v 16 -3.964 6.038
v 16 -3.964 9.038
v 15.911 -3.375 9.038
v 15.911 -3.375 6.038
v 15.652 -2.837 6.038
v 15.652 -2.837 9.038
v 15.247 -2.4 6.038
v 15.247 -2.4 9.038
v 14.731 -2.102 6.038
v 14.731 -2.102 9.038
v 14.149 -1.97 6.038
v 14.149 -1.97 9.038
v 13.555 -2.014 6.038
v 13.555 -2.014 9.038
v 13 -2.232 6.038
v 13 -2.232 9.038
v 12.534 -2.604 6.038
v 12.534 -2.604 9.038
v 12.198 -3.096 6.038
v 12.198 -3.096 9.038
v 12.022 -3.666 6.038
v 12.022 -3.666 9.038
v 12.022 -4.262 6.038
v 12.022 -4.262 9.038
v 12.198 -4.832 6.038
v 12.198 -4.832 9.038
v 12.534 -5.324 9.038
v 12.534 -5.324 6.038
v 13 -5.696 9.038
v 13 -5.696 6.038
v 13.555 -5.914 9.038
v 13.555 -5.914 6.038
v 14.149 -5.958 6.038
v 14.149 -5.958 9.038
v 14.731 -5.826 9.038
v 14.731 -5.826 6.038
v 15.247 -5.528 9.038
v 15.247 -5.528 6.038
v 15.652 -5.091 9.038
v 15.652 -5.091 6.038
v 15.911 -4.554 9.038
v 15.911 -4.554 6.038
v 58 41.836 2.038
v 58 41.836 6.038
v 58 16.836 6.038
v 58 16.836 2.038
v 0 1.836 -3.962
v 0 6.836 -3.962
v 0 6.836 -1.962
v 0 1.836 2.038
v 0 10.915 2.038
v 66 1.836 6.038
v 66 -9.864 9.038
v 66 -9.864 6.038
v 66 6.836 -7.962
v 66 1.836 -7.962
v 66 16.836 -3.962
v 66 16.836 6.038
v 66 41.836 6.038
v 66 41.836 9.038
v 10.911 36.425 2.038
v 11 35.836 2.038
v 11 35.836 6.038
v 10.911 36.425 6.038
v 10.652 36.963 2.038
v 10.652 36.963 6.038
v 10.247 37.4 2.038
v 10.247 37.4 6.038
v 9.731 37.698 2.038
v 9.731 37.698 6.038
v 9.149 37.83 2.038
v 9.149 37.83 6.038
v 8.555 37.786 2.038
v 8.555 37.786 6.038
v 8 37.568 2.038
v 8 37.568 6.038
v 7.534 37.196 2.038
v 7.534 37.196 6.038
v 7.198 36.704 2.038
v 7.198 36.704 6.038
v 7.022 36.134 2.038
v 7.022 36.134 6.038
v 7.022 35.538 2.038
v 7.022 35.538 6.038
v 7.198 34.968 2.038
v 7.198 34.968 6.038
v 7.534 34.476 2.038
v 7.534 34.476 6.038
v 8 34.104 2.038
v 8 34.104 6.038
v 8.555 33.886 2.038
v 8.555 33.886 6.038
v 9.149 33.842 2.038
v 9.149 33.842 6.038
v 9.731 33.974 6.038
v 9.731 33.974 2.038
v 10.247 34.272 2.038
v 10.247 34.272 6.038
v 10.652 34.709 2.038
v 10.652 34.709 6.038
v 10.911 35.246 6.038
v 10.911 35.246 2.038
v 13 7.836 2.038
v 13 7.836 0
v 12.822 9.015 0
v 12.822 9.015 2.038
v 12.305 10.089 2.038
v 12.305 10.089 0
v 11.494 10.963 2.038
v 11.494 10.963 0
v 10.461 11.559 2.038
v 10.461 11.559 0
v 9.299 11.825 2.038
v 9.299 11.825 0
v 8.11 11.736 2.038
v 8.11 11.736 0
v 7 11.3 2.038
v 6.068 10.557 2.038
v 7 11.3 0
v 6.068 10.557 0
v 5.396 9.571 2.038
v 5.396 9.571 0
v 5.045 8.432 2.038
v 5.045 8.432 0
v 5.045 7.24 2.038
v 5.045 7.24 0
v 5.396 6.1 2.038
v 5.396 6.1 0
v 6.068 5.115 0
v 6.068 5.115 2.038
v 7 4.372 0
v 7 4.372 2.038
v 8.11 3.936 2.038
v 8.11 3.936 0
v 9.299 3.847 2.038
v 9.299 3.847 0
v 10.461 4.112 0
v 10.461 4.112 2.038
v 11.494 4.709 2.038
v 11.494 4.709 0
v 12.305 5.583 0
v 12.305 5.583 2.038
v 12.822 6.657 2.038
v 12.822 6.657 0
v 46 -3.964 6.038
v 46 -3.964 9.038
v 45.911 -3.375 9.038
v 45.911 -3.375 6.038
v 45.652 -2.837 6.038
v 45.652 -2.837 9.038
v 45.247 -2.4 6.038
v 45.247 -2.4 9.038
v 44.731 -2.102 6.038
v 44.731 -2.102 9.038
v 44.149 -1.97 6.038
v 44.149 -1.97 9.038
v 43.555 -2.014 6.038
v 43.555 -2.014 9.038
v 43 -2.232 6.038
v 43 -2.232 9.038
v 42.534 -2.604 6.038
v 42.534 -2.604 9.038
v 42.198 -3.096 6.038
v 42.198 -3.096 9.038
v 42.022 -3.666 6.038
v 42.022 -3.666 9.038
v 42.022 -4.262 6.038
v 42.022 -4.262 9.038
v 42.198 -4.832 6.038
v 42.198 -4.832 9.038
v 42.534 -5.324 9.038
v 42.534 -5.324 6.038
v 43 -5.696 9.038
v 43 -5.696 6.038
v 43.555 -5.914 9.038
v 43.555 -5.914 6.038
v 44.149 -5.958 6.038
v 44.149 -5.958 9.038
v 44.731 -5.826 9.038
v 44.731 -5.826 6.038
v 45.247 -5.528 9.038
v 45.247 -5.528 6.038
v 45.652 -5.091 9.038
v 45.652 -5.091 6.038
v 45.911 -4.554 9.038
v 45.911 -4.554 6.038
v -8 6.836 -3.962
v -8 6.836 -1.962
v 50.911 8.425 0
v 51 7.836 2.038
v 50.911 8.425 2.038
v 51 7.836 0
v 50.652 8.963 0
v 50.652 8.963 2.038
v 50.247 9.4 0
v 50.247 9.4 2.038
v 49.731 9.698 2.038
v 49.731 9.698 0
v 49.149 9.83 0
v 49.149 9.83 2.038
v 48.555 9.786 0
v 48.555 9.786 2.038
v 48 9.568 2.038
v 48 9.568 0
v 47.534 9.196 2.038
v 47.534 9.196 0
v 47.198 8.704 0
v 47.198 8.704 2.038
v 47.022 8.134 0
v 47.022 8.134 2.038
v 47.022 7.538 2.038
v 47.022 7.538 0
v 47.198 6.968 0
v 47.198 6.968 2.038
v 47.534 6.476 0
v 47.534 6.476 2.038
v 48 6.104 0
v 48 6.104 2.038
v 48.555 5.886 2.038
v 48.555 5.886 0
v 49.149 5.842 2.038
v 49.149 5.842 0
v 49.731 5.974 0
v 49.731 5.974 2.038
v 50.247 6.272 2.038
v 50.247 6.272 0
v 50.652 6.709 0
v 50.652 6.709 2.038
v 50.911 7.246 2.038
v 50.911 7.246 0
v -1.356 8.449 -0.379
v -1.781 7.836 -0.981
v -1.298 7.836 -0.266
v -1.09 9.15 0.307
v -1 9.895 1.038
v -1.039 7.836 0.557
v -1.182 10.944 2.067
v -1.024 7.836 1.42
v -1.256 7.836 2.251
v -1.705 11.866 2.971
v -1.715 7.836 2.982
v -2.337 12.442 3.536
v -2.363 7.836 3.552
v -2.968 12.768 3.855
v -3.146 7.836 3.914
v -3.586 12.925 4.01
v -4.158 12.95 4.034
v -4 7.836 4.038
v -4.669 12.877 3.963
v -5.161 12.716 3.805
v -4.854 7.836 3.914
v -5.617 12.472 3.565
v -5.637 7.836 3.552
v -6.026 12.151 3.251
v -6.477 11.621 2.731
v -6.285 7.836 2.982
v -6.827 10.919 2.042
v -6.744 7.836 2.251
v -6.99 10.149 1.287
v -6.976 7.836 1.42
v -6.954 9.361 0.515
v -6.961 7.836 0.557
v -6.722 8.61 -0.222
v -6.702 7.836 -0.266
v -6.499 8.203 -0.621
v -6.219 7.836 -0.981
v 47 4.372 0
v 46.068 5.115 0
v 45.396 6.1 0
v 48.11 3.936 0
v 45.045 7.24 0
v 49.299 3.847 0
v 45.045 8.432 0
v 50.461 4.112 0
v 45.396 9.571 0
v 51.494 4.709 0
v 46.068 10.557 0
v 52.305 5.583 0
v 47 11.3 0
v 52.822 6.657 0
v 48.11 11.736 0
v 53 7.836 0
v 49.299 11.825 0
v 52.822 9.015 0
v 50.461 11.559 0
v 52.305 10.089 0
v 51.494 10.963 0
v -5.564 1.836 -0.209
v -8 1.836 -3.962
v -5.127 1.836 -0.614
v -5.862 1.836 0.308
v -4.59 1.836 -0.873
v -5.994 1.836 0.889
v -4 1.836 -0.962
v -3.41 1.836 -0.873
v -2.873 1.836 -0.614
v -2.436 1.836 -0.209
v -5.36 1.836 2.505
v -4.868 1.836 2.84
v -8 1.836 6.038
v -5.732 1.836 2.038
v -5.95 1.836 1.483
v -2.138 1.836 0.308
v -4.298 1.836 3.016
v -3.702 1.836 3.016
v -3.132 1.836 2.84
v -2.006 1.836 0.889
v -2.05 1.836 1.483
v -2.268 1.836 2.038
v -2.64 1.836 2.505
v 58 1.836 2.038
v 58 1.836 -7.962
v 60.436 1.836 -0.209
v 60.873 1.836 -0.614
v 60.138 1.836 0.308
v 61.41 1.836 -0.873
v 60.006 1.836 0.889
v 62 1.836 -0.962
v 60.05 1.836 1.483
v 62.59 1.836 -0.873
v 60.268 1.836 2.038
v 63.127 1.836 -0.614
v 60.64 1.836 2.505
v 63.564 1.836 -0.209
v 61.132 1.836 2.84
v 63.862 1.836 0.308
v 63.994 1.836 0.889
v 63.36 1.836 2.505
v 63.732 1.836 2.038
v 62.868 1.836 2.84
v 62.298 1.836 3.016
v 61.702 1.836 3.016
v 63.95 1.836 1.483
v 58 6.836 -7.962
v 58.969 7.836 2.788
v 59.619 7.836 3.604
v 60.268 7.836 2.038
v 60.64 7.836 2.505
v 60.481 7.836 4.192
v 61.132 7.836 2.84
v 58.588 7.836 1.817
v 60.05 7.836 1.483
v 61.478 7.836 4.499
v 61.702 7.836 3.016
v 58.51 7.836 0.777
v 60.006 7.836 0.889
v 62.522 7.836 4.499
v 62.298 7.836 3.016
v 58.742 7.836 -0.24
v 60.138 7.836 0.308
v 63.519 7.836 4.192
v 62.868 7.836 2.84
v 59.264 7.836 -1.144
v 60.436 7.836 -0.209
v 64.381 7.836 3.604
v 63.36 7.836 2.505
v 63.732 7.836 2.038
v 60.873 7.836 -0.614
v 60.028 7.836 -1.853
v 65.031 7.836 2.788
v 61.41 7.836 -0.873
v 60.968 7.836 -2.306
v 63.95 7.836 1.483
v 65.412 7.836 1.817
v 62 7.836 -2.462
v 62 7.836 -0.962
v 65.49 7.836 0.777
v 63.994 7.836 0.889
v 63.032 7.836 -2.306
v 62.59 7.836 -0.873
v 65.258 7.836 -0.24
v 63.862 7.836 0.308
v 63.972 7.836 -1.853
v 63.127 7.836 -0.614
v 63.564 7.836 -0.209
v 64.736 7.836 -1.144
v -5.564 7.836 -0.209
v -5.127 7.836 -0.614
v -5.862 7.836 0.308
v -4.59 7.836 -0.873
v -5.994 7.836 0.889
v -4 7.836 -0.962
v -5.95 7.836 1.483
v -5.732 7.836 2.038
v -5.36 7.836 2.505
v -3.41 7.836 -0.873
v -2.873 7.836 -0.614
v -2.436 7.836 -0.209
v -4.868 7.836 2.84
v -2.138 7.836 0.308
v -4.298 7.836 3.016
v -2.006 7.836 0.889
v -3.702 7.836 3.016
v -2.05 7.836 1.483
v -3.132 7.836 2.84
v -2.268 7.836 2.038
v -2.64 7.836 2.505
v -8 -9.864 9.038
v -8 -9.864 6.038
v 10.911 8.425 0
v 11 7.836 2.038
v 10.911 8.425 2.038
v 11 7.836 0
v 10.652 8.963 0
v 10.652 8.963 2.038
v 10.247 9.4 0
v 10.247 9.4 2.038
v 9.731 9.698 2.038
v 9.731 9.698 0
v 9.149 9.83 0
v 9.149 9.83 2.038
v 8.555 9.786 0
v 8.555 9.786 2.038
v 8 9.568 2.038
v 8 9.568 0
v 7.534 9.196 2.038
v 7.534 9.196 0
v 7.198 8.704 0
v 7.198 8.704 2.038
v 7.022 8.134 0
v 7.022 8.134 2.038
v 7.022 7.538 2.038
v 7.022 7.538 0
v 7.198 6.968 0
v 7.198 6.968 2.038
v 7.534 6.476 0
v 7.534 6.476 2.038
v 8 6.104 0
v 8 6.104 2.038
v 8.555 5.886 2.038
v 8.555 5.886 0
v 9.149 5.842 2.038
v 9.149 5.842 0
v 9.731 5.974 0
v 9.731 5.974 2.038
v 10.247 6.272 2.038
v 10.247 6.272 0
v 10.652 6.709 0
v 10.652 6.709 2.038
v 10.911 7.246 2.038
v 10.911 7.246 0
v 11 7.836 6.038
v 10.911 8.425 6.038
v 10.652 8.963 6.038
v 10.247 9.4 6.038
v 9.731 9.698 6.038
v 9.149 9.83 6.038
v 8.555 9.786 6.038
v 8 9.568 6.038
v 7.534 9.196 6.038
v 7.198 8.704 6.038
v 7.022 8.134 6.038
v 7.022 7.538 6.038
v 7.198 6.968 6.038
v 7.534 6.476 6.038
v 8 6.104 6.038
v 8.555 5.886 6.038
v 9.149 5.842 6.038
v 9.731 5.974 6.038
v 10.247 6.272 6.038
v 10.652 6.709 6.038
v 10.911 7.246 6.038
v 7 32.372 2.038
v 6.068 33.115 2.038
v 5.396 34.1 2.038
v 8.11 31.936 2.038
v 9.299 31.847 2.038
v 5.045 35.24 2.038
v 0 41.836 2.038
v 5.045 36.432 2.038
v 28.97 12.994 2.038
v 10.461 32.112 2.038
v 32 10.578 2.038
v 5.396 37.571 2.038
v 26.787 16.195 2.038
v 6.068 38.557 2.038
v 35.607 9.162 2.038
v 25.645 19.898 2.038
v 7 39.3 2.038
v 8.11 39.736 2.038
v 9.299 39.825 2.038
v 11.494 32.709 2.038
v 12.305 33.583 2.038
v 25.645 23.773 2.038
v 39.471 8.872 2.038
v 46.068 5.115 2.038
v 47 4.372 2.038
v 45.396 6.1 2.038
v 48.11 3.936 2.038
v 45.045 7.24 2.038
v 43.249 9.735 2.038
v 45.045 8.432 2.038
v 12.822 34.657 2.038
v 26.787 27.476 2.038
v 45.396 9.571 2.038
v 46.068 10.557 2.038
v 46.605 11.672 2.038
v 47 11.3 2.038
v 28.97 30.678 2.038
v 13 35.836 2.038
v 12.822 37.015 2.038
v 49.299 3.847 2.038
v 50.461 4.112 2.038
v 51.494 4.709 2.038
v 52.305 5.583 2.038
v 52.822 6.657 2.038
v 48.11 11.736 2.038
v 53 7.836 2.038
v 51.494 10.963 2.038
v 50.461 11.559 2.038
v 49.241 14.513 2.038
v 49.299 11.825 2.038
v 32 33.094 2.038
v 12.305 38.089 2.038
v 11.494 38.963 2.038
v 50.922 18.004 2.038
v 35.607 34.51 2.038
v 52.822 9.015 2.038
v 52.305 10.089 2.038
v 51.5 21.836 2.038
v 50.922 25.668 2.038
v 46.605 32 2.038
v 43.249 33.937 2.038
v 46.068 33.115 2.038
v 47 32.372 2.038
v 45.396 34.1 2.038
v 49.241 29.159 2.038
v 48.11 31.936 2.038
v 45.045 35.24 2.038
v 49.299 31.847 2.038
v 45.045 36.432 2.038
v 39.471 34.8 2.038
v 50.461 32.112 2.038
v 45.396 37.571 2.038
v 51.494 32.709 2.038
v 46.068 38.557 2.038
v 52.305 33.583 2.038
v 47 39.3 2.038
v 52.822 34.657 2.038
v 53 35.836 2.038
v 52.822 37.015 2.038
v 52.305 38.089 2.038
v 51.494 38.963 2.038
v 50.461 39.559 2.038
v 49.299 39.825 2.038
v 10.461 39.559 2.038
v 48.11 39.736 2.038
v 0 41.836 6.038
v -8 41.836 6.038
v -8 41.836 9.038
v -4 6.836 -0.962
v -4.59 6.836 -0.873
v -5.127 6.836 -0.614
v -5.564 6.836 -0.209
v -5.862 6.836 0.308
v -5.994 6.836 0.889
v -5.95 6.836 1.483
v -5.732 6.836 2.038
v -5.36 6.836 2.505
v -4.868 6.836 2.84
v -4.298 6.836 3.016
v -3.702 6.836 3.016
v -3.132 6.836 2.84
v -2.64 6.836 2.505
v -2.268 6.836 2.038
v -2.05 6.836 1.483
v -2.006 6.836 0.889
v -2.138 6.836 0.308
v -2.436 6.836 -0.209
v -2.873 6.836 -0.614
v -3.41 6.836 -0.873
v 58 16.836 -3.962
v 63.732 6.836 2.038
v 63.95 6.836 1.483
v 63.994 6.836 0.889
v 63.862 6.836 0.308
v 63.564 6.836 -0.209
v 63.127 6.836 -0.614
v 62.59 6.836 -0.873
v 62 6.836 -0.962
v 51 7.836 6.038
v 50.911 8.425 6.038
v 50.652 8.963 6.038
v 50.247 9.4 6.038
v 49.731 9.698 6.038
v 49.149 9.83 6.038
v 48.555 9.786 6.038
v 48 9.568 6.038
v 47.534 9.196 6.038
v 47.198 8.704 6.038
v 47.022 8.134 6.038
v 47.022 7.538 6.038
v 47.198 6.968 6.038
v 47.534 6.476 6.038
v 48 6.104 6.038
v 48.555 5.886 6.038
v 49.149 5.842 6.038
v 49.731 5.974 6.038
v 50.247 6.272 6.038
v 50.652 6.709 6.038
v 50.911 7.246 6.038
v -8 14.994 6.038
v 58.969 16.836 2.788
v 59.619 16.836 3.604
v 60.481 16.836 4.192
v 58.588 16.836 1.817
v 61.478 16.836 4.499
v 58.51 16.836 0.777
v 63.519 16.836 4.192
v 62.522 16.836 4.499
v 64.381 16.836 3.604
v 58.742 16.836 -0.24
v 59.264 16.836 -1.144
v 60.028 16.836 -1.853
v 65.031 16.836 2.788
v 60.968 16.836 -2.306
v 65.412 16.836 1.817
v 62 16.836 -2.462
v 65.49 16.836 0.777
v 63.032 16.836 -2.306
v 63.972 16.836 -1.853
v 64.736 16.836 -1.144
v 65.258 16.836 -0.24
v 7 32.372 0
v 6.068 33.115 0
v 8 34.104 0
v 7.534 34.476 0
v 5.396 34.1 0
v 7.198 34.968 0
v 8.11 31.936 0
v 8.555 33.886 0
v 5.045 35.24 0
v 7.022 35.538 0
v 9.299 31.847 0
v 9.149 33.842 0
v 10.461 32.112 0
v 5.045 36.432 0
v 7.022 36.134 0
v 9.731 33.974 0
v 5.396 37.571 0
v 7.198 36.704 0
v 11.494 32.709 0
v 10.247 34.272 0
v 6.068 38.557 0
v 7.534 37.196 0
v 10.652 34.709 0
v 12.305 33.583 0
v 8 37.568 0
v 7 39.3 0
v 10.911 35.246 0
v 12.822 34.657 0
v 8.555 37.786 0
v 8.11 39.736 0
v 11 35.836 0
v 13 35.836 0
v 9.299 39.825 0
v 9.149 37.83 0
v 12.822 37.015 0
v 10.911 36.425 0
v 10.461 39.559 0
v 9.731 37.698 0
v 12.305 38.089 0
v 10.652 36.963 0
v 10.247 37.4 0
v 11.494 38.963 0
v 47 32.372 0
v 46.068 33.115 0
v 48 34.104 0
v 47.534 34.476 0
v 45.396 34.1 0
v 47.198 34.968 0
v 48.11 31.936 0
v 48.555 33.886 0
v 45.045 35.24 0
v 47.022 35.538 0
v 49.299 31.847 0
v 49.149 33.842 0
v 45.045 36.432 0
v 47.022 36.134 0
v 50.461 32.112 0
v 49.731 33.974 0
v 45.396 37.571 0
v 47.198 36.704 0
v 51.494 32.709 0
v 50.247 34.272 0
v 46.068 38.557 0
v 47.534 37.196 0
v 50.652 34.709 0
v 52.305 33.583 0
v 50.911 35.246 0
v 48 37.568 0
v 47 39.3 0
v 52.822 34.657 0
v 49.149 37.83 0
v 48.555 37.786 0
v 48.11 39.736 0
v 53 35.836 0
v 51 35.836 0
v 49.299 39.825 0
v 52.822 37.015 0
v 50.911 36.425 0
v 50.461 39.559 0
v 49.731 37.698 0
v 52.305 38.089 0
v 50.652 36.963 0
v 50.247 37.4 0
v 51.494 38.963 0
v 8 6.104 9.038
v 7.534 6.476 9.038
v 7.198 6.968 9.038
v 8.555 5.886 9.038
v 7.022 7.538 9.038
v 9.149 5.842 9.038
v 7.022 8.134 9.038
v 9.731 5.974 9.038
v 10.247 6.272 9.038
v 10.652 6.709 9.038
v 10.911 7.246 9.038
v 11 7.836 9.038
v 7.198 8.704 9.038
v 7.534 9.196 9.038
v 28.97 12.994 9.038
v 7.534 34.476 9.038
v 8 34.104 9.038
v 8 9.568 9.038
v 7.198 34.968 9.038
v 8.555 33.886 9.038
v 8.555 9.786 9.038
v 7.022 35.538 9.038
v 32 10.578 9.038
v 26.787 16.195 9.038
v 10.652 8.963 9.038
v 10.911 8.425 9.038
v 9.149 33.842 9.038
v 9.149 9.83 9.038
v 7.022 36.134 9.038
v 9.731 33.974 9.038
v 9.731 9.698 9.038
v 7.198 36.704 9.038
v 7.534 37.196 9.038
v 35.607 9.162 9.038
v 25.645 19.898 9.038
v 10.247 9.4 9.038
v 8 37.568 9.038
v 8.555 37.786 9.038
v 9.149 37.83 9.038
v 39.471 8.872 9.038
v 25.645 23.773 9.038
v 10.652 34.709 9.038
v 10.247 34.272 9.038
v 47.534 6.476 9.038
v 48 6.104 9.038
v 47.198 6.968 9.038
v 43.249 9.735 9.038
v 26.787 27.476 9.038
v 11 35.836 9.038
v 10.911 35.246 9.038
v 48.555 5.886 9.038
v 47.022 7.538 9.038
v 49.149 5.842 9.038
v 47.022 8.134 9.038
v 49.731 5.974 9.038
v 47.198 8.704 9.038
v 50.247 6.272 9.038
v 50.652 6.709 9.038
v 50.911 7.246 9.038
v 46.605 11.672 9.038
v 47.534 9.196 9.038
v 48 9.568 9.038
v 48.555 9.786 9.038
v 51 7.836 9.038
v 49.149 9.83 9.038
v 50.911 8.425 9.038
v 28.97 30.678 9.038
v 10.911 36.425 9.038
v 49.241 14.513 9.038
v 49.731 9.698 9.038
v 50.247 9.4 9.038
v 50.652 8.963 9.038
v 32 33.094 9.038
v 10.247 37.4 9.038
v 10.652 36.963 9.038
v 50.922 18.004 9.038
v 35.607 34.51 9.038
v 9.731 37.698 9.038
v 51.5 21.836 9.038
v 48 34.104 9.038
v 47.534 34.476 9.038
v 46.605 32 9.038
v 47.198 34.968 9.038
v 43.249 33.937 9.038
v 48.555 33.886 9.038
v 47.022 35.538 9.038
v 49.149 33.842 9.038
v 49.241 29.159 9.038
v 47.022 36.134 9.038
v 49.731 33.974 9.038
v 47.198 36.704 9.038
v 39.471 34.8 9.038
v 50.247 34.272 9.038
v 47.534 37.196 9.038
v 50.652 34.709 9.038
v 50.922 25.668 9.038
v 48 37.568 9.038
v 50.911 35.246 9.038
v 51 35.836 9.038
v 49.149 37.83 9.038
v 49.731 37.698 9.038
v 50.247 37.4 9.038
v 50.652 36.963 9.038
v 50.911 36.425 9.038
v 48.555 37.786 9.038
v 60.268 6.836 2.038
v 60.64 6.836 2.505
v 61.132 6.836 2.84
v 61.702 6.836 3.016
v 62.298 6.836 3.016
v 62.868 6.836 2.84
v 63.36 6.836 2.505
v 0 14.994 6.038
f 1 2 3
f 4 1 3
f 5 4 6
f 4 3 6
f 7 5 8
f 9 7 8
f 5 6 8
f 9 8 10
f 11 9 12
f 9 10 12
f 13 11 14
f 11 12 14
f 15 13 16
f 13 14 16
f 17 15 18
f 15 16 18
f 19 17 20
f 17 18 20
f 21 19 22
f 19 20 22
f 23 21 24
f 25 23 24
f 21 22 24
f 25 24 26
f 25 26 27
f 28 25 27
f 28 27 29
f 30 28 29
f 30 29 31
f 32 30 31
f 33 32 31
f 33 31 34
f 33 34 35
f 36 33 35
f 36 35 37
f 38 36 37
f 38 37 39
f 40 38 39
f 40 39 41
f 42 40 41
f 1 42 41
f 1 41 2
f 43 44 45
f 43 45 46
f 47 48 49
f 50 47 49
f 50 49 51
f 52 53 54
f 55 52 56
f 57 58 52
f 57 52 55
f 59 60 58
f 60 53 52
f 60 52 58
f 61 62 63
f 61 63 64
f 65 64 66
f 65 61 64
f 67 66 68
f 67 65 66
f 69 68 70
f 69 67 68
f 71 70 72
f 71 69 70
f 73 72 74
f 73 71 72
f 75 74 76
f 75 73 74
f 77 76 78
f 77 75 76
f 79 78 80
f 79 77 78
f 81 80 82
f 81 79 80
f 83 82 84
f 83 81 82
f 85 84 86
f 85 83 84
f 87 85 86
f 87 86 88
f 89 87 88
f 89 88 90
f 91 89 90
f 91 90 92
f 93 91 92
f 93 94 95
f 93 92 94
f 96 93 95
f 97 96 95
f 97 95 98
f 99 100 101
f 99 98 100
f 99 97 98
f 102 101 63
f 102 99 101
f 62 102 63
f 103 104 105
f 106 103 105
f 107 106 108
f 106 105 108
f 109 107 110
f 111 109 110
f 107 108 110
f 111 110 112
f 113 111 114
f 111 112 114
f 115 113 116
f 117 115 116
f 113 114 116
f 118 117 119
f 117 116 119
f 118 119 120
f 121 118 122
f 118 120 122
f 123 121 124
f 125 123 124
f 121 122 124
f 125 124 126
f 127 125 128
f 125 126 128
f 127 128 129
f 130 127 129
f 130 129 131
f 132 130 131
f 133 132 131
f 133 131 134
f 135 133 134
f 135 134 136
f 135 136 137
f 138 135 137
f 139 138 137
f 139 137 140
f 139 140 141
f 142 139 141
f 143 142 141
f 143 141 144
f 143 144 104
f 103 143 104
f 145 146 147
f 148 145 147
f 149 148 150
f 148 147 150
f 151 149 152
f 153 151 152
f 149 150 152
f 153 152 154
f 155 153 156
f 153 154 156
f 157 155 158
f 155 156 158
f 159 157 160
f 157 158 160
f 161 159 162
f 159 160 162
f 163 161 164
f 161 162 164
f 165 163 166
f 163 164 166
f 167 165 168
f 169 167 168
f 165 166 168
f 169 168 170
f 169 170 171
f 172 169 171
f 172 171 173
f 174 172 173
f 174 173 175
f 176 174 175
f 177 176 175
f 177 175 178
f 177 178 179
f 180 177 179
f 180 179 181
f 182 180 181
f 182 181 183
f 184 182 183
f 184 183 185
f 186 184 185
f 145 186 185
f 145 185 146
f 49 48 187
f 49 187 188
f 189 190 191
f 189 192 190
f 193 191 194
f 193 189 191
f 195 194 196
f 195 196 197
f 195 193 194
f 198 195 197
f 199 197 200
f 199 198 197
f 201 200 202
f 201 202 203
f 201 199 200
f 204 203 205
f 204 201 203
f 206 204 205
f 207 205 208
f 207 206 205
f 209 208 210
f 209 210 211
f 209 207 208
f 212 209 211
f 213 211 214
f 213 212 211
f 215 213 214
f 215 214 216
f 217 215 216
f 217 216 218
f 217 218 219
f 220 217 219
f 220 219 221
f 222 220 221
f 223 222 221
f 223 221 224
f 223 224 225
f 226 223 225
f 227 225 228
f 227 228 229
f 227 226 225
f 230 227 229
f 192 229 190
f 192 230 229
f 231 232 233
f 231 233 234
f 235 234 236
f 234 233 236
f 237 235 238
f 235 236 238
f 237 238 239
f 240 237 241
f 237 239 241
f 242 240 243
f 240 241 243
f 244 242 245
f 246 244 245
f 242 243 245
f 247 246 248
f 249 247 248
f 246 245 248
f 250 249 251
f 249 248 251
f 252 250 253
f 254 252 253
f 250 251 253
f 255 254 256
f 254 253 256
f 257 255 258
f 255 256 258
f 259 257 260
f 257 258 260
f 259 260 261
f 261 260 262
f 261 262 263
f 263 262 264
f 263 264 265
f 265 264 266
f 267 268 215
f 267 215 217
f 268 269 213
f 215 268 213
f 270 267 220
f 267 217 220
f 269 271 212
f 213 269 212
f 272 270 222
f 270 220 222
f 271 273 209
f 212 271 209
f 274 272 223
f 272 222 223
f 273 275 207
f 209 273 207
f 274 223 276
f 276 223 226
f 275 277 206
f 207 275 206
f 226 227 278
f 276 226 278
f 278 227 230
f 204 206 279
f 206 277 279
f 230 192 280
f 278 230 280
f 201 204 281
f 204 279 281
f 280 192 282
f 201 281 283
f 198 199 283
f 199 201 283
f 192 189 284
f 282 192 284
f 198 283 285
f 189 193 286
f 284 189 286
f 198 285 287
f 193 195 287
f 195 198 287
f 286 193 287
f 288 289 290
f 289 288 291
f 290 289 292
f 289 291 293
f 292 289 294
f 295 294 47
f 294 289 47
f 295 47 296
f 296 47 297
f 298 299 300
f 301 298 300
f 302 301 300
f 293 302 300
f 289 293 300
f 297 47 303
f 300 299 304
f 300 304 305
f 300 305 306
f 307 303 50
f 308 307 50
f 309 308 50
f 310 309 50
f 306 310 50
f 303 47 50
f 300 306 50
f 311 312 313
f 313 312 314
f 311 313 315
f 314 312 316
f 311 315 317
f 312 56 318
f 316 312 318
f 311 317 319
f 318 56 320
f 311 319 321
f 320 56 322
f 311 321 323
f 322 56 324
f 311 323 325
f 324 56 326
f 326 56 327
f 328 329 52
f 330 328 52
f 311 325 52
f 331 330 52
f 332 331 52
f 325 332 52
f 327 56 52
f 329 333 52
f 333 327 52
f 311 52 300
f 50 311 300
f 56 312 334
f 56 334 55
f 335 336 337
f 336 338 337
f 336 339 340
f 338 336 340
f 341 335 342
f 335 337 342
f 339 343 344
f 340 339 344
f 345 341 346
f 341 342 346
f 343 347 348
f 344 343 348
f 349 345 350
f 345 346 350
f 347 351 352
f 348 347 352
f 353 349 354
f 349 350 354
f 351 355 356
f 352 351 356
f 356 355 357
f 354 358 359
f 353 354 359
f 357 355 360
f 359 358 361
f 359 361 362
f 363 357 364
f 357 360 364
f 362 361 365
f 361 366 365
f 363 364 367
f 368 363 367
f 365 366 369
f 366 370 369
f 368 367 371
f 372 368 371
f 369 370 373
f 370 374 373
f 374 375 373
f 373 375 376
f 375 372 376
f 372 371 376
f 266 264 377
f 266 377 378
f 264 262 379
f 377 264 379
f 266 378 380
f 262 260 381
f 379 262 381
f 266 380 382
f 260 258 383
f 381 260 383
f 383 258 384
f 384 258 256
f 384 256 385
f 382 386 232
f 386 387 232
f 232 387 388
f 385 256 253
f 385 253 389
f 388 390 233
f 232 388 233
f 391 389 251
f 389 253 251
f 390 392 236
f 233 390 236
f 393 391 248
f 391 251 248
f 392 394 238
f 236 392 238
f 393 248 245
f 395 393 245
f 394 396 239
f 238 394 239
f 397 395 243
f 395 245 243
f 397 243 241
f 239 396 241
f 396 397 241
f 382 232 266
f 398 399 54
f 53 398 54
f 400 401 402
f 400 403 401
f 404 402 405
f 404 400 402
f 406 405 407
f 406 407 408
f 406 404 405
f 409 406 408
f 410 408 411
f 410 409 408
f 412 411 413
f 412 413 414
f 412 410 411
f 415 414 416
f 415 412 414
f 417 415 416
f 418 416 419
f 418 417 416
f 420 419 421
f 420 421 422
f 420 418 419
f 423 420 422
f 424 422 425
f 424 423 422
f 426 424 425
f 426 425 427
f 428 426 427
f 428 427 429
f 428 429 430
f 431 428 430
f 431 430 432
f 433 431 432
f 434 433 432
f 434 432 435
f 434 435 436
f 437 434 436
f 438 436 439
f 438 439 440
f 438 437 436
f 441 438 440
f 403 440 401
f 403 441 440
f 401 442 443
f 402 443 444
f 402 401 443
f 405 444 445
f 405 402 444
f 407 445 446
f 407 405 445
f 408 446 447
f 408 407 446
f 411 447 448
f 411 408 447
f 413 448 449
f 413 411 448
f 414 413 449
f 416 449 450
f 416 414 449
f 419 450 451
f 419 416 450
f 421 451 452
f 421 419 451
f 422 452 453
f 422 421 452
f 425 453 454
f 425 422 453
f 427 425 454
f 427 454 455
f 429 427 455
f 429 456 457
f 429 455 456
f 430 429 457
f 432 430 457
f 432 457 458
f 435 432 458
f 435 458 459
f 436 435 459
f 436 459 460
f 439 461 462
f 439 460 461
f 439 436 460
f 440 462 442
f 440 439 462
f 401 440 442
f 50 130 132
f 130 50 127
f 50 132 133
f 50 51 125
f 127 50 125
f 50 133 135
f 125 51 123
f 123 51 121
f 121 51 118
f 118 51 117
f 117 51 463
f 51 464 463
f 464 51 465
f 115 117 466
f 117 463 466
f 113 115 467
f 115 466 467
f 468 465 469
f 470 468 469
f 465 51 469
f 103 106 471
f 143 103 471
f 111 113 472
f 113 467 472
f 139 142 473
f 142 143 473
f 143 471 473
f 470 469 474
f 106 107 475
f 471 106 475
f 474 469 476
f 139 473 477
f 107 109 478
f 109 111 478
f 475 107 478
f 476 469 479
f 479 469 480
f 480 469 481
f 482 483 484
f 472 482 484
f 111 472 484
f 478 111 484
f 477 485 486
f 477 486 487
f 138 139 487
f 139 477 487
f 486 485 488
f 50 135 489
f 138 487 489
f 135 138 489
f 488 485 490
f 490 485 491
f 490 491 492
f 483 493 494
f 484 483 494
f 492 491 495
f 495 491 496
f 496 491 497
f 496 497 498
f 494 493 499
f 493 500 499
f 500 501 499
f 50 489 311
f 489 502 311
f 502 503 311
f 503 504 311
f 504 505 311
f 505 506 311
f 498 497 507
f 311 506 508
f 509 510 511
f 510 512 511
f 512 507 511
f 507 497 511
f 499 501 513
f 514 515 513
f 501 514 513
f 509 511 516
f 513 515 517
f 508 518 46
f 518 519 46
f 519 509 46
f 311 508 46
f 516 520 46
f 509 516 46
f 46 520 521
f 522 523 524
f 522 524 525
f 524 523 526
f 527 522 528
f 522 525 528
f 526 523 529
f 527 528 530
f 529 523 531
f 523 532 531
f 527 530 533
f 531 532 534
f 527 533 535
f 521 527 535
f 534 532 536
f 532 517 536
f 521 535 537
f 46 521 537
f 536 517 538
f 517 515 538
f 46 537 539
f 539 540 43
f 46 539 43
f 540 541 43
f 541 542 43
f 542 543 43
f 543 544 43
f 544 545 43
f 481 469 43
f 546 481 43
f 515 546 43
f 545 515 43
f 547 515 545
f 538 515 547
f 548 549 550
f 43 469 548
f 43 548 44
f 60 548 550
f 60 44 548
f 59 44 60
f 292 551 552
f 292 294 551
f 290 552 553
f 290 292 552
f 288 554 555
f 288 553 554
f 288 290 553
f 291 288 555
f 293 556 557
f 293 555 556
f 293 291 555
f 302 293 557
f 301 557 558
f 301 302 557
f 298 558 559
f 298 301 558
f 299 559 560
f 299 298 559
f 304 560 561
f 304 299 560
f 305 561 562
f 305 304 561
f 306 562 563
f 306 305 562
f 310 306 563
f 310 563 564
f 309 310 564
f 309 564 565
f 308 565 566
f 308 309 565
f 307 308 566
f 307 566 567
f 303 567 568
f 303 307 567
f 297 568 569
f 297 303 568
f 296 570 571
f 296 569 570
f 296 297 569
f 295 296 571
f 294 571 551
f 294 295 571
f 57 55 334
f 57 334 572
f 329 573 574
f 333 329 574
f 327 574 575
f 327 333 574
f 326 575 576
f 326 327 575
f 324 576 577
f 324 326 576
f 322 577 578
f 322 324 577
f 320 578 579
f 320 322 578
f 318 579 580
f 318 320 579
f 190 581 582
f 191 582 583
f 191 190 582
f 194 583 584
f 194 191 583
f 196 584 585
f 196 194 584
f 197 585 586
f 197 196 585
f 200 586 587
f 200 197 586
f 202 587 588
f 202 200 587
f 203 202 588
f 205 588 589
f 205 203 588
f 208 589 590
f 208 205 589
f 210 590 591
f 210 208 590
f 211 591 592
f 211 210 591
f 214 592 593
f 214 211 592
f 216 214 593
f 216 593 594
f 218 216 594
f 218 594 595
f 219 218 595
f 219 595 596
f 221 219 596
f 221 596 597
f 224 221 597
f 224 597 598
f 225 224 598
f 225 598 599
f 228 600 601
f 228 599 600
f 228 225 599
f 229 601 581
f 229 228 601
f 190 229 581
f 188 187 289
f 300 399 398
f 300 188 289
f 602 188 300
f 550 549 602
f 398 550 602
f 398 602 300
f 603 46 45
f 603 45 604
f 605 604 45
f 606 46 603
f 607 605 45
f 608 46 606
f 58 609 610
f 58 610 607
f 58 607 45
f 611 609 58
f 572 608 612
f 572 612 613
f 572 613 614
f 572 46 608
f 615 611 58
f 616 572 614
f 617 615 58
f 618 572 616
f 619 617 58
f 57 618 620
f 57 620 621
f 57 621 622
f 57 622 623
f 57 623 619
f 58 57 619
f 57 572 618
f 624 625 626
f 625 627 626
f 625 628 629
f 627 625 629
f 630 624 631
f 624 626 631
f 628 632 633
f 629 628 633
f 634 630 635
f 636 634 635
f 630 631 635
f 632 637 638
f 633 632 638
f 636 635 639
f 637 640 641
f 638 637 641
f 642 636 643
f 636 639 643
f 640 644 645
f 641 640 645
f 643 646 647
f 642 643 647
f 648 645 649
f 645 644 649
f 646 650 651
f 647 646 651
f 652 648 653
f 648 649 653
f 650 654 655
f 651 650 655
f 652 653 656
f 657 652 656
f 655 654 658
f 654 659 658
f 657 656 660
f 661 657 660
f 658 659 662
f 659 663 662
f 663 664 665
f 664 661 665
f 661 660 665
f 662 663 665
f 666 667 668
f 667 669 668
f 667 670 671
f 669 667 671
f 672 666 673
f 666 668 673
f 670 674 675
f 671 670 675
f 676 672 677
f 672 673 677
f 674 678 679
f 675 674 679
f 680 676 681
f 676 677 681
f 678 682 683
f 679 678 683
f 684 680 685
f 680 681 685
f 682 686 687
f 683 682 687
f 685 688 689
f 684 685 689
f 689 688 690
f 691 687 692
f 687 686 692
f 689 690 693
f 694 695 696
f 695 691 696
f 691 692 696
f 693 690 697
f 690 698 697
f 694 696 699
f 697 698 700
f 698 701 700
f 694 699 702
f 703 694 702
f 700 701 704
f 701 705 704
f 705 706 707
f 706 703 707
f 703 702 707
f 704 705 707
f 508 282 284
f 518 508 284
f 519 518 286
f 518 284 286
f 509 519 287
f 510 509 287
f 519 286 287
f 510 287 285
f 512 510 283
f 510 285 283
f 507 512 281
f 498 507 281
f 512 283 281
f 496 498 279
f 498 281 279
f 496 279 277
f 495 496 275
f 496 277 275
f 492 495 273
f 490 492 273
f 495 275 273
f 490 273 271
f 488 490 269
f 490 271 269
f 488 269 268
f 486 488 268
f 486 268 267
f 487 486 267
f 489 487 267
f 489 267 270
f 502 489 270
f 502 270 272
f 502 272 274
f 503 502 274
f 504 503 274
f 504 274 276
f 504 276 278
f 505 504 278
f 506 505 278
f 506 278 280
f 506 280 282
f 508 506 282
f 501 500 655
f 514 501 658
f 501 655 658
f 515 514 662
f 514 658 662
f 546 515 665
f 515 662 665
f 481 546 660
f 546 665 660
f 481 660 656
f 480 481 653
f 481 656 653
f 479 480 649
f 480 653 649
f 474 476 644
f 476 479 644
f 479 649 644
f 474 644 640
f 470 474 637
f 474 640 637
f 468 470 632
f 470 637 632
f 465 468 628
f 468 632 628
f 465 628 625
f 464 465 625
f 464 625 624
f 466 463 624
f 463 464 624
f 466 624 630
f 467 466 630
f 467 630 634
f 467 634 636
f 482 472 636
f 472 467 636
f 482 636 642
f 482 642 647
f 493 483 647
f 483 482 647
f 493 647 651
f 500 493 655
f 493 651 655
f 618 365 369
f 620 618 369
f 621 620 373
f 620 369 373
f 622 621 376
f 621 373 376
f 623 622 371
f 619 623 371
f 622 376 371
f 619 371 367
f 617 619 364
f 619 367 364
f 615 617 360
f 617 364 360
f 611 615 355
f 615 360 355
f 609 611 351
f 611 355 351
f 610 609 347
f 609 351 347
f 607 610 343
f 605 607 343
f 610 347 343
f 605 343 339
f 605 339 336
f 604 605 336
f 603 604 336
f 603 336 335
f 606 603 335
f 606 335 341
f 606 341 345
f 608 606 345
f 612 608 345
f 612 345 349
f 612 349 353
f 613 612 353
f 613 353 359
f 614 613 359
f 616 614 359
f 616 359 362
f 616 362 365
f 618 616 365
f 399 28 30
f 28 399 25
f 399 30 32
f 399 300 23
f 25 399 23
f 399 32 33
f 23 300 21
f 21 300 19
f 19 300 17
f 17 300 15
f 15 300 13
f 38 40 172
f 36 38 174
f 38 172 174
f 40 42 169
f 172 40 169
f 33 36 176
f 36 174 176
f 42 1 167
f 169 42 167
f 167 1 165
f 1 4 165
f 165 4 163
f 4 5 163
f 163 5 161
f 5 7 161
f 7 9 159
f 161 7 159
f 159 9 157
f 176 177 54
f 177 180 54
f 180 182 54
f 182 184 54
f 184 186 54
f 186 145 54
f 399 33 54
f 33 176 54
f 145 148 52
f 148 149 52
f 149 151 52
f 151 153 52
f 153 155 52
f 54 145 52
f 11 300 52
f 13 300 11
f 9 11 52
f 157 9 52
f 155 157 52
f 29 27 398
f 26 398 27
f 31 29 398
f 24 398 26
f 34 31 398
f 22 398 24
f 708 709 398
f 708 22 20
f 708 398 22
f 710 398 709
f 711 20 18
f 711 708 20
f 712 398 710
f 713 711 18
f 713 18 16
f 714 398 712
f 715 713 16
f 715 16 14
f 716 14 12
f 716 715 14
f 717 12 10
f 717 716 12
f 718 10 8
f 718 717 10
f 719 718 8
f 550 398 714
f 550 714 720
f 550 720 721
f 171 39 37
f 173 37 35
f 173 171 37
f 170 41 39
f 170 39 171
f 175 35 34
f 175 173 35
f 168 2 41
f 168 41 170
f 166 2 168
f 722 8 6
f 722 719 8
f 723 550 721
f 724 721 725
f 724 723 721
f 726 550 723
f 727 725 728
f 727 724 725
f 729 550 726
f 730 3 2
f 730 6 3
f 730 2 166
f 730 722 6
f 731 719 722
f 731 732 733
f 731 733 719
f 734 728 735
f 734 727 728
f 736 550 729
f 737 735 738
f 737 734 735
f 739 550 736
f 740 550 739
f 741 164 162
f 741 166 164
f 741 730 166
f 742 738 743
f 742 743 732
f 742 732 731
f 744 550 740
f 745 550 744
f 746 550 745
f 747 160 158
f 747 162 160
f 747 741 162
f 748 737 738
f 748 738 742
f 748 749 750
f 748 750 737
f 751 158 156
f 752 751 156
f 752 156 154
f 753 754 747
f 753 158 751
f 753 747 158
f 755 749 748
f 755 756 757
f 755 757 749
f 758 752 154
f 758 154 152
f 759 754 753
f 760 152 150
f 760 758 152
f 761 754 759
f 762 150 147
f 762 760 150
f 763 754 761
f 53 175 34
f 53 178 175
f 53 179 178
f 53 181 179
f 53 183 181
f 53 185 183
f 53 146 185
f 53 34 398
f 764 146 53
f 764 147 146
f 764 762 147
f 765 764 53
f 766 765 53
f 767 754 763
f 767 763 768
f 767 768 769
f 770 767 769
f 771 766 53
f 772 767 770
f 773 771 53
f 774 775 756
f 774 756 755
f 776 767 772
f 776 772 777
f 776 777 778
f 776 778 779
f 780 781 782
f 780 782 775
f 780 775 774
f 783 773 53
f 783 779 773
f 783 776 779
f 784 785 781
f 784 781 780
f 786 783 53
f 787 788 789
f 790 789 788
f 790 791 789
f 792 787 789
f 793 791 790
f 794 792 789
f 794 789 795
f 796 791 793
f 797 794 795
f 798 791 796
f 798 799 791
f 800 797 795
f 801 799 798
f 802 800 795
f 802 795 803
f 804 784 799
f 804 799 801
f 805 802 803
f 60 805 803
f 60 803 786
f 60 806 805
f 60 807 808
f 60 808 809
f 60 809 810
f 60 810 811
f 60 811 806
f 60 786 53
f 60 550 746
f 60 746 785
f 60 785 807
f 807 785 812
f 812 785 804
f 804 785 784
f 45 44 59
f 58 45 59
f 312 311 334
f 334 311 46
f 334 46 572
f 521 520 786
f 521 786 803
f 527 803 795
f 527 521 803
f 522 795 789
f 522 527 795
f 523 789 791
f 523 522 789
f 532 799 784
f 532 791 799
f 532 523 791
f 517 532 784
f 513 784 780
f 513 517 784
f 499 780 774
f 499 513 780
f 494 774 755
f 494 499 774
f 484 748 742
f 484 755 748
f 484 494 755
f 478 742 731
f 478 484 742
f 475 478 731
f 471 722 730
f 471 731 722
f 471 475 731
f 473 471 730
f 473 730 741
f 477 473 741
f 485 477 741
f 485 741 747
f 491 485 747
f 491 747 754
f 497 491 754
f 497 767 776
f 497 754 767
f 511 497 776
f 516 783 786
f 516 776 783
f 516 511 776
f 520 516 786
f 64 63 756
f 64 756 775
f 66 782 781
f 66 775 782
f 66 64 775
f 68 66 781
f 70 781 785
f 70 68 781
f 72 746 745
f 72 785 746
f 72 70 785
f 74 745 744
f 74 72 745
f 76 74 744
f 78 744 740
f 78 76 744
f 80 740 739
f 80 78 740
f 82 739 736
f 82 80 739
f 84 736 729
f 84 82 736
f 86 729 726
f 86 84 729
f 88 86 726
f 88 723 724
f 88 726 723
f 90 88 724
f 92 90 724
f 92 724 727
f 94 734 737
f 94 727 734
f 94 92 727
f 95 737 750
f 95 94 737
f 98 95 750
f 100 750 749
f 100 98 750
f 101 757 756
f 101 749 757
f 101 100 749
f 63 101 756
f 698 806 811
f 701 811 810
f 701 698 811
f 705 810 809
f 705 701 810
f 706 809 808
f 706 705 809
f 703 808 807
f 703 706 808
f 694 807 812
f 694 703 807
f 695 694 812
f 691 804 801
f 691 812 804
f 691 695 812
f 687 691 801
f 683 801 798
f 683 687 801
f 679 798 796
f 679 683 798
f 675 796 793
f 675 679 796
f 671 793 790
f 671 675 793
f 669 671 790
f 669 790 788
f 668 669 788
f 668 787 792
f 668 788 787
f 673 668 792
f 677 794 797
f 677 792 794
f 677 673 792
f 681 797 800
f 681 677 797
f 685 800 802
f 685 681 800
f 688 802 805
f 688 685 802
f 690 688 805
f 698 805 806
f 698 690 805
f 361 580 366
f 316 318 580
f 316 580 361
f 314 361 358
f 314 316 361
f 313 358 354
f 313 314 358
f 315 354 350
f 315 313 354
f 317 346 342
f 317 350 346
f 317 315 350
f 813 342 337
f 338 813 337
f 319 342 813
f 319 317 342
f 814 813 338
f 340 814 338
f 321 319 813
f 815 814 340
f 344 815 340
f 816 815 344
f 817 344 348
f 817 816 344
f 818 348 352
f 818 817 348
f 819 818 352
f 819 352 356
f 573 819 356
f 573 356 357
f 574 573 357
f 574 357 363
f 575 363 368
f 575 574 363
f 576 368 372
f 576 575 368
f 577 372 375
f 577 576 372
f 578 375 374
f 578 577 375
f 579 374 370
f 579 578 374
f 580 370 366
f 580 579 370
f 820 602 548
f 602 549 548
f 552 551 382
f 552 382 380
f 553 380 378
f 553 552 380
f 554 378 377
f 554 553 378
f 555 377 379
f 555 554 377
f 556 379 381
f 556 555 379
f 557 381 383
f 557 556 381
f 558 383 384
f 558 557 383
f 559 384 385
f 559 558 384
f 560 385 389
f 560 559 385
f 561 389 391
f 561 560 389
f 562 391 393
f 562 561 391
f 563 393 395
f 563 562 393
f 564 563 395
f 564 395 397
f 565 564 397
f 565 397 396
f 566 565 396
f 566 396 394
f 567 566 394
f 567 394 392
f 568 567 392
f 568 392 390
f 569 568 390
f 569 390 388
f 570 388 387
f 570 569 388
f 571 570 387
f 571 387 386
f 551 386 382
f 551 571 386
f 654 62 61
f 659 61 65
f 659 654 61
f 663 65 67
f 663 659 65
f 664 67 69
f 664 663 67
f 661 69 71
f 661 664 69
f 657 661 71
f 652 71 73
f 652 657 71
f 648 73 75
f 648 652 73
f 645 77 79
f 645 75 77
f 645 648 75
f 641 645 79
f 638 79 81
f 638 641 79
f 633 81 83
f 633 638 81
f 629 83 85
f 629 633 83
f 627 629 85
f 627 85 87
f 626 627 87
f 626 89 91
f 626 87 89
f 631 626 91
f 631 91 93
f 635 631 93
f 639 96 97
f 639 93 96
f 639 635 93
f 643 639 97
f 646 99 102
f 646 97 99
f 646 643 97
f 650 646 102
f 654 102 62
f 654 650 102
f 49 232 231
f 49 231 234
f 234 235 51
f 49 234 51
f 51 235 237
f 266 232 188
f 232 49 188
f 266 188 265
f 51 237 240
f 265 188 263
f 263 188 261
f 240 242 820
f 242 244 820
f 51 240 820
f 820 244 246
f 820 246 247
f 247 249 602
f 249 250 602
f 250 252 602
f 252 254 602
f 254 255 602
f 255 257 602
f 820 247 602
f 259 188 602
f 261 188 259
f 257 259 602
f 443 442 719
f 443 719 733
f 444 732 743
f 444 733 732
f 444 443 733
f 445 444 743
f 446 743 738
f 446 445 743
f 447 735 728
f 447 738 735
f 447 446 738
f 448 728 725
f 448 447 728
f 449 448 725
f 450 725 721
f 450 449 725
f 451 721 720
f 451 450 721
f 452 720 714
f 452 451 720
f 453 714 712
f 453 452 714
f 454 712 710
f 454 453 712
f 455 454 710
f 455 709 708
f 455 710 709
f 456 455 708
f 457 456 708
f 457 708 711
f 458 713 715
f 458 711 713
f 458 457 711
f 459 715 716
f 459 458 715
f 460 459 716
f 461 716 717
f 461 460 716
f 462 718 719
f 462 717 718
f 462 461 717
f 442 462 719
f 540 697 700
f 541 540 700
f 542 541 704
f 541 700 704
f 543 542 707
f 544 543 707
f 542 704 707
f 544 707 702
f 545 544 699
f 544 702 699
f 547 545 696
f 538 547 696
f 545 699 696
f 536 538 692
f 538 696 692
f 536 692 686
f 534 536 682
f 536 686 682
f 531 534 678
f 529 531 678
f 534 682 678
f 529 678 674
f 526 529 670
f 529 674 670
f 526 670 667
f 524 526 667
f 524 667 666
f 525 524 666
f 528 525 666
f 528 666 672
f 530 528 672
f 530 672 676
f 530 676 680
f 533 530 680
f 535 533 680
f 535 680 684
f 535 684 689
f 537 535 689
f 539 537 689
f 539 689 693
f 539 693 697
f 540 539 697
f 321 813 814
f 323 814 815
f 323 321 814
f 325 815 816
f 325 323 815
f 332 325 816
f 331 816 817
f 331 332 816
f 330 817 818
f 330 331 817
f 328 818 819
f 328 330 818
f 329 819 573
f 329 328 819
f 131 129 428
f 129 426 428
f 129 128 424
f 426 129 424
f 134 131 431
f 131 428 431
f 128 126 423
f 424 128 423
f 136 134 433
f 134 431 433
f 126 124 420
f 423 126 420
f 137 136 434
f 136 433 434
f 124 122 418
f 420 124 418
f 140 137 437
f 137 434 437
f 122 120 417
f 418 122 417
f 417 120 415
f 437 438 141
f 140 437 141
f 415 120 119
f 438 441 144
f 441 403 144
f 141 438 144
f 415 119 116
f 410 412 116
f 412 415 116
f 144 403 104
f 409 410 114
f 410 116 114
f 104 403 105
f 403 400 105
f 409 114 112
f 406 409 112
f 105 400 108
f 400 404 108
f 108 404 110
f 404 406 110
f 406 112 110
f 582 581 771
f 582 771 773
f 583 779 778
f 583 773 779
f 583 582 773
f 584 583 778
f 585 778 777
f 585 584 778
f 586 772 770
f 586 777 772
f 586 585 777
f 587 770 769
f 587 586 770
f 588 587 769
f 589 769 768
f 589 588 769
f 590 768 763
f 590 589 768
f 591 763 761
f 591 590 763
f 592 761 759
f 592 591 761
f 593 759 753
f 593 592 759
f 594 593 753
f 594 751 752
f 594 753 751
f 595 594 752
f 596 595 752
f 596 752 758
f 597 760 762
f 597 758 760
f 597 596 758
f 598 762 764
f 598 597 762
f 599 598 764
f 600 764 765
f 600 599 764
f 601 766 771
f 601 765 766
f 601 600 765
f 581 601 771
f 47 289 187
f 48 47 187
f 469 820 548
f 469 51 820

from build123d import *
from build123d.topology import SkipClean

# Parameters (mm, degrees)
SKETCH1_R               = 4
SKETCH1_R_2             = 2
BOSS_EXTRUDE2_DEPTH     = 6.038447986
BOSS_EXTRUDE2_2_DEPTH   = 6.038447986
BOSS_EXTRUDE2_3_DEPTH   = 6.038447986
BOSS_EXTRUDE2_4_DEPTH   = 6.038447986
SKETCH3_W               = 74
SKETCH3_H               = 51.7
BOSS_EXTRUDE4_DEPTH     = 3
BOSS_EXTRUDE3_START     = 11.7
SKETCH2_W               = 8
SKETCH2_H               = 8
SKETCH2_R               = 2
SKETCH2_H_2             = 14
BOSS_EXTRUDE3_DEPTH     = 5
SKETCH1_4_R             = 2
SKETCH1_4_R_2           = 13
CUT_EXTRUDE1_DEPTH      = 10
BOSS_EXTRUDE5_DEPTH     = 8
BOSS_EXTRUDE7_DEPTH     = 8
SKETCH2_2_R             = 2
CUT_EXTRUDE2_DEPTH      = 85.324276113
CUT_EXTRUDE3_START      = -6
SKETCH5_R               = 3.5
SKETCH5_R_2             = 3
CUT_EXTRUDE3_DEPTH      = 72.702596752
BOSS_EXTRUDE8_START     = -4
SKETCH3_3_W             = 58
SKETCH3_3_H             = 35
SKETCH3_3_R             = 4
SKETCH3_3_W_2           = 74
SKETCH3_3_H_2           = 5
BOSS_EXTRUDE8_DEPTH     = 4
CUT_EXTRUDE5_DEPTH      = 79.663462115
CUT_EXTRUDE5_DEPTH_BACK = 79.663462115
SKETCH1_6_R             = 13
SKETCH8_W               = 8
SKETCH8_H               = 14
SKETCH8_H_2             = 11.313736344
CUT_EXTRUDE6_DEPTH      = 25
BOSS_EXTRUDE10_START    = -8
SKETCH9_W               = 10
SKETCH9_H               = 5
BOSS_EXTRUDE10_DEPTH    = 8
SKETCH2_3_R             = 2
CUT_EXTRUDE7_DEPTH      = 25
SKETCH10_R              = 2
CUT_EXTRUDE8_DEPTH      = 25
SKETCH2_4_R             = 2
CUT_EXTRUDE9_DEPTH      = 25
SKETCH1_7_R             = 2
CUT_EXTRUDE10_DEPTH     = 25


with BuildPart() as part:
    # Sketch1 → Boss-Extrude2 (new body)
    with BuildSketch(Plane.XY):
        with Locations((49, 35.83595021)):
            Circle(SKETCH1_R)
        with Locations((49, 35.83595021)):
            Circle(SKETCH1_R_2, mode=Mode.SUBTRACT)
    extrude(amount=BOSS_EXTRUDE2_DEPTH)



with BuildPart() as body_2:
    # Sketch1 → Boss-Extrude2 2 (new body)
    with BuildSketch(Plane.XY):
        with Locations((49, 7.83595021)):
            Circle(SKETCH1_R)
        with Locations((49, 7.83595021)):
            Circle(SKETCH1_R_2, mode=Mode.SUBTRACT)
    extrude(amount=BOSS_EXTRUDE2_2_DEPTH)


with BuildPart() as body_3:
    # Sketch1 → Boss-Extrude2 3 (new body)
    with BuildSketch(Plane.XY):
        with Locations((9, 7.83595021)):
            Circle(SKETCH1_R)
        with Locations((9, 7.83595021)):
            Circle(SKETCH1_R_2, mode=Mode.SUBTRACT)
    extrude(amount=BOSS_EXTRUDE2_3_DEPTH)


with BuildPart() as body_4:
    # Sketch1 → Boss-Extrude2 4 (new body)
    with BuildSketch(Plane.XY):
        with Locations((9, 35.83595021)):
            Circle(SKETCH1_R)
        with Locations((9, 35.83595021)):
            Circle(SKETCH1_R_2, mode=Mode.SUBTRACT)
    extrude(amount=BOSS_EXTRUDE2_4_DEPTH)


with BuildPart() as part_1:
    add(part.part)

    add(body_2.part)  # Boss-Extrude4 merges body 2

    add(body_3.part)  # Boss-Extrude4 merges body 3

    add(body_4.part)  # Boss-Extrude4 merges body 4
    # Sketch3 → Boss-Extrude4 (add)
    with BuildSketch(Plane.XY.offset(6.038447986)):
        with Locations((29, 15.98595021)):
            Rectangle(SKETCH3_W, SKETCH3_H)
    extrude(amount=BOSS_EXTRUDE4_DEPTH)

    # Sketch2 → Boss-Extrude3 (add)
    # profile 1 of 2: a face of its own
    with BuildSketch(Plane(origin=(0, -9.86404979, 0), x_dir=(1, 0, 0), z_dir=(0, 1, 0)).offset(BOSS_EXTRUDE3_START)):
        with Locations((-4, -2.038447986)):
            Rectangle(SKETCH2_W, SKETCH2_H)
        with Locations(Location((-4, -1.038447986, 0), (0, 0, 270))):
            Circle(SKETCH2_R, mode=Mode.SUBTRACT)
    # profile 2 of 2: a face of its own
    with BuildSketch(Plane(origin=(0, -9.86404979, 0), x_dir=(1, 0, 0), z_dir=(0, 1, 0)).offset(BOSS_EXTRUDE3_START)):
        with Locations((62, 0.961552014)):
            Rectangle(SKETCH2_W, SKETCH2_H_2)
        with Locations(Location((62, -1.038447986, 0), (0, 0, 270))):
            Circle(SKETCH2_R, mode=Mode.SUBTRACT)
    extrude(amount=BOSS_EXTRUDE3_DEPTH)

    # Sketch1<4> → Cut-Extrude1 (cut)
    with BuildSketch(Plane.XY):
        with Locations((9, 35.83595021)):
            Circle(SKETCH1_4_R)
        with Locations((9, 7.83595021)):
            Circle(SKETCH1_4_R)
        with Locations((49, 35.83595021)):
            Circle(SKETCH1_4_R)
        with Locations((38.5, 21.83595021)):
            Circle(SKETCH1_4_R_2)
        with Locations((49, 7.83595021)):
            Circle(SKETCH1_4_R)
    extrude(amount=CUT_EXTRUDE1_DEPTH, mode=Mode.SUBTRACT)

    # Sketch4 → Boss-Extrude5 (add)
    with BuildSketch(Plane(origin=(66, 0, 0), x_dir=(0, 0, -1), z_dir=(1, 0, 0))):
        Polygon((7.961552014, 6.83595021), (-6.038447986, 41.83595021), (-6.038447986, 6.83595021), align=None)
    extrude(amount=-BOSS_EXTRUDE5_DEPTH)

    # Sketch6 → Boss-Extrude7 (add)
    with BuildSketch(Plane.ZY.offset(8)):
        Polygon((-1.961552014, 6.83595021), (6.038447986, 14.993789145), (6.038447986, 6.83595021), align=None)
    extrude(amount=-BOSS_EXTRUDE7_DEPTH)

    # Sketch2<2> → Cut-Extrude2 (cut, through all)
    with SkipClean():  # the faces are left unmerged after this step: merging them gives an invalid solid
        with BuildSketch(Plane(origin=(0, -9.86404979, 0), x_dir=(1, 0, 0), z_dir=(0, 1, 0))):
            with Locations(Location((62, -1.038447986, 0), (0, 0, 90))):
                Circle(SKETCH2_2_R)
            with Locations(Location((-4, -1.038447986, 0), (0, 0, 90))):
                Circle(SKETCH2_2_R)
        extrude(amount=CUT_EXTRUDE2_DEPTH, mode=Mode.SUBTRACT)
    add(part_1.part.scale(1), mode=Mode.REPLACE)  # the faces are merged on a copy

    # Sketch5 → Cut-Extrude3 (cut, through all)
    with SkipClean():  # the faces are left unmerged after this step: merging them gives an invalid solid
        with BuildSketch(Plane.XZ.offset(-1.83595021).offset(CUT_EXTRUDE3_START)):
            with Locations(Location((62, 1.038447986, 0), (0, 0, 270))):
                Circle(SKETCH5_R)
            with Locations((-4, 1.038447986)):
                Circle(SKETCH5_R_2)
        extrude(amount=-CUT_EXTRUDE3_DEPTH, mode=Mode.SUBTRACT)

    # Sketch3<3> → Boss-Extrude8 (add)
    # profile 1 of 2: a face of its own
    with BuildSketch(Plane.XY.offset(6.038447986).offset(BOSS_EXTRUDE8_START)):
        with Locations((29, 24.33595021)):
            Rectangle(SKETCH3_3_W, SKETCH3_3_H)
        with Locations((49, 35.83595021)):
            Circle(SKETCH3_3_R, mode=Mode.SUBTRACT)
    # profile 2 of 2: a face of its own
    with BuildSketch(Plane.XY.offset(6.038447986).offset(BOSS_EXTRUDE8_START)):
        with Locations((29, 4.33595021)):
            Rectangle(SKETCH3_3_W_2, SKETCH3_3_H_2)
    extrude(amount=BOSS_EXTRUDE8_DEPTH)

    # Sketch1<6> → Cut-Extrude5 (cut, two sides: drawn at the far end of the back side and taken through both)
    with BuildSketch(Plane.XY.offset(-CUT_EXTRUDE5_DEPTH_BACK)):
        with Locations((38.5, 21.83595021)):
            Circle(SKETCH1_6_R)
    extrude(amount=CUT_EXTRUDE5_DEPTH + CUT_EXTRUDE5_DEPTH_BACK, mode=Mode.SUBTRACT)

    # Sketch8 → Cut-Extrude6 (cut)
    with BuildSketch(Plane(origin=(0, 41.83595021, 0), x_dir=(1, 0, 0), z_dir=(0, 1, 0))):
        with Locations((62, 0.961552014)):
            Rectangle(SKETCH8_W, SKETCH8_H)
        with Locations((-4, -0.381579814)):
            Rectangle(SKETCH8_W, SKETCH8_H_2)
    extrude(amount=-CUT_EXTRUDE6_DEPTH, mode=Mode.SUBTRACT)

    # Sketch9 → Boss-Extrude10 (add)
    with BuildSketch(Plane.ZY.offset(8).offset(BOSS_EXTRUDE10_START)):
        with Locations((1.038447986, 4.33595021)):
            Rectangle(SKETCH9_W, SKETCH9_H)
    extrude(amount=BOSS_EXTRUDE10_DEPTH)

    # Sketch2<3> → Cut-Extrude7 (cut)
    with BuildSketch(Plane(origin=(0, -9.86404979, 0), x_dir=(1, 0, 0), z_dir=(0, 1, 0))):
        with Locations(Location((-4, -1.038447986, 0), (0, 0, 90))):
            Circle(SKETCH2_3_R)
    extrude(amount=CUT_EXTRUDE7_DEPTH, mode=Mode.SUBTRACT)

    # Sketch10 → Cut-Extrude8 (cut)
    with BuildSketch(Plane.XY.offset(9.038447986)):
        with Locations((44, -3.96404979)):
            Circle(SKETCH10_R)
        with Locations((14, -3.96404979)):
            Circle(SKETCH10_R)
    extrude(amount=-CUT_EXTRUDE8_DEPTH, mode=Mode.SUBTRACT)

    # Sketch2<4> → Cut-Extrude9 (cut)
    with BuildSketch(Plane(origin=(0, -9.86404979, 0), x_dir=(1, 0, 0), z_dir=(0, 1, 0))):
        with Locations(Location((62, -1.038447986, 0), (0, 0, 90))):
            Circle(SKETCH2_4_R)
    extrude(amount=CUT_EXTRUDE9_DEPTH, mode=Mode.SUBTRACT)

    # Sketch1<7> → Cut-Extrude10 (cut)
    with BuildSketch(Plane.XY):
        with Locations((9, 35.83595021)):
            Circle(SKETCH1_7_R)
        with Locations((9, 7.83595021)):
            Circle(SKETCH1_7_R)
        with Locations((49, 35.83595021)):
            Circle(SKETCH1_7_R)
        with Locations((49, 7.83595021)):
            Circle(SKETCH1_7_R)
    extrude(amount=CUT_EXTRUDE10_DEPTH, mode=Mode.SUBTRACT)


solid = part_1.part
